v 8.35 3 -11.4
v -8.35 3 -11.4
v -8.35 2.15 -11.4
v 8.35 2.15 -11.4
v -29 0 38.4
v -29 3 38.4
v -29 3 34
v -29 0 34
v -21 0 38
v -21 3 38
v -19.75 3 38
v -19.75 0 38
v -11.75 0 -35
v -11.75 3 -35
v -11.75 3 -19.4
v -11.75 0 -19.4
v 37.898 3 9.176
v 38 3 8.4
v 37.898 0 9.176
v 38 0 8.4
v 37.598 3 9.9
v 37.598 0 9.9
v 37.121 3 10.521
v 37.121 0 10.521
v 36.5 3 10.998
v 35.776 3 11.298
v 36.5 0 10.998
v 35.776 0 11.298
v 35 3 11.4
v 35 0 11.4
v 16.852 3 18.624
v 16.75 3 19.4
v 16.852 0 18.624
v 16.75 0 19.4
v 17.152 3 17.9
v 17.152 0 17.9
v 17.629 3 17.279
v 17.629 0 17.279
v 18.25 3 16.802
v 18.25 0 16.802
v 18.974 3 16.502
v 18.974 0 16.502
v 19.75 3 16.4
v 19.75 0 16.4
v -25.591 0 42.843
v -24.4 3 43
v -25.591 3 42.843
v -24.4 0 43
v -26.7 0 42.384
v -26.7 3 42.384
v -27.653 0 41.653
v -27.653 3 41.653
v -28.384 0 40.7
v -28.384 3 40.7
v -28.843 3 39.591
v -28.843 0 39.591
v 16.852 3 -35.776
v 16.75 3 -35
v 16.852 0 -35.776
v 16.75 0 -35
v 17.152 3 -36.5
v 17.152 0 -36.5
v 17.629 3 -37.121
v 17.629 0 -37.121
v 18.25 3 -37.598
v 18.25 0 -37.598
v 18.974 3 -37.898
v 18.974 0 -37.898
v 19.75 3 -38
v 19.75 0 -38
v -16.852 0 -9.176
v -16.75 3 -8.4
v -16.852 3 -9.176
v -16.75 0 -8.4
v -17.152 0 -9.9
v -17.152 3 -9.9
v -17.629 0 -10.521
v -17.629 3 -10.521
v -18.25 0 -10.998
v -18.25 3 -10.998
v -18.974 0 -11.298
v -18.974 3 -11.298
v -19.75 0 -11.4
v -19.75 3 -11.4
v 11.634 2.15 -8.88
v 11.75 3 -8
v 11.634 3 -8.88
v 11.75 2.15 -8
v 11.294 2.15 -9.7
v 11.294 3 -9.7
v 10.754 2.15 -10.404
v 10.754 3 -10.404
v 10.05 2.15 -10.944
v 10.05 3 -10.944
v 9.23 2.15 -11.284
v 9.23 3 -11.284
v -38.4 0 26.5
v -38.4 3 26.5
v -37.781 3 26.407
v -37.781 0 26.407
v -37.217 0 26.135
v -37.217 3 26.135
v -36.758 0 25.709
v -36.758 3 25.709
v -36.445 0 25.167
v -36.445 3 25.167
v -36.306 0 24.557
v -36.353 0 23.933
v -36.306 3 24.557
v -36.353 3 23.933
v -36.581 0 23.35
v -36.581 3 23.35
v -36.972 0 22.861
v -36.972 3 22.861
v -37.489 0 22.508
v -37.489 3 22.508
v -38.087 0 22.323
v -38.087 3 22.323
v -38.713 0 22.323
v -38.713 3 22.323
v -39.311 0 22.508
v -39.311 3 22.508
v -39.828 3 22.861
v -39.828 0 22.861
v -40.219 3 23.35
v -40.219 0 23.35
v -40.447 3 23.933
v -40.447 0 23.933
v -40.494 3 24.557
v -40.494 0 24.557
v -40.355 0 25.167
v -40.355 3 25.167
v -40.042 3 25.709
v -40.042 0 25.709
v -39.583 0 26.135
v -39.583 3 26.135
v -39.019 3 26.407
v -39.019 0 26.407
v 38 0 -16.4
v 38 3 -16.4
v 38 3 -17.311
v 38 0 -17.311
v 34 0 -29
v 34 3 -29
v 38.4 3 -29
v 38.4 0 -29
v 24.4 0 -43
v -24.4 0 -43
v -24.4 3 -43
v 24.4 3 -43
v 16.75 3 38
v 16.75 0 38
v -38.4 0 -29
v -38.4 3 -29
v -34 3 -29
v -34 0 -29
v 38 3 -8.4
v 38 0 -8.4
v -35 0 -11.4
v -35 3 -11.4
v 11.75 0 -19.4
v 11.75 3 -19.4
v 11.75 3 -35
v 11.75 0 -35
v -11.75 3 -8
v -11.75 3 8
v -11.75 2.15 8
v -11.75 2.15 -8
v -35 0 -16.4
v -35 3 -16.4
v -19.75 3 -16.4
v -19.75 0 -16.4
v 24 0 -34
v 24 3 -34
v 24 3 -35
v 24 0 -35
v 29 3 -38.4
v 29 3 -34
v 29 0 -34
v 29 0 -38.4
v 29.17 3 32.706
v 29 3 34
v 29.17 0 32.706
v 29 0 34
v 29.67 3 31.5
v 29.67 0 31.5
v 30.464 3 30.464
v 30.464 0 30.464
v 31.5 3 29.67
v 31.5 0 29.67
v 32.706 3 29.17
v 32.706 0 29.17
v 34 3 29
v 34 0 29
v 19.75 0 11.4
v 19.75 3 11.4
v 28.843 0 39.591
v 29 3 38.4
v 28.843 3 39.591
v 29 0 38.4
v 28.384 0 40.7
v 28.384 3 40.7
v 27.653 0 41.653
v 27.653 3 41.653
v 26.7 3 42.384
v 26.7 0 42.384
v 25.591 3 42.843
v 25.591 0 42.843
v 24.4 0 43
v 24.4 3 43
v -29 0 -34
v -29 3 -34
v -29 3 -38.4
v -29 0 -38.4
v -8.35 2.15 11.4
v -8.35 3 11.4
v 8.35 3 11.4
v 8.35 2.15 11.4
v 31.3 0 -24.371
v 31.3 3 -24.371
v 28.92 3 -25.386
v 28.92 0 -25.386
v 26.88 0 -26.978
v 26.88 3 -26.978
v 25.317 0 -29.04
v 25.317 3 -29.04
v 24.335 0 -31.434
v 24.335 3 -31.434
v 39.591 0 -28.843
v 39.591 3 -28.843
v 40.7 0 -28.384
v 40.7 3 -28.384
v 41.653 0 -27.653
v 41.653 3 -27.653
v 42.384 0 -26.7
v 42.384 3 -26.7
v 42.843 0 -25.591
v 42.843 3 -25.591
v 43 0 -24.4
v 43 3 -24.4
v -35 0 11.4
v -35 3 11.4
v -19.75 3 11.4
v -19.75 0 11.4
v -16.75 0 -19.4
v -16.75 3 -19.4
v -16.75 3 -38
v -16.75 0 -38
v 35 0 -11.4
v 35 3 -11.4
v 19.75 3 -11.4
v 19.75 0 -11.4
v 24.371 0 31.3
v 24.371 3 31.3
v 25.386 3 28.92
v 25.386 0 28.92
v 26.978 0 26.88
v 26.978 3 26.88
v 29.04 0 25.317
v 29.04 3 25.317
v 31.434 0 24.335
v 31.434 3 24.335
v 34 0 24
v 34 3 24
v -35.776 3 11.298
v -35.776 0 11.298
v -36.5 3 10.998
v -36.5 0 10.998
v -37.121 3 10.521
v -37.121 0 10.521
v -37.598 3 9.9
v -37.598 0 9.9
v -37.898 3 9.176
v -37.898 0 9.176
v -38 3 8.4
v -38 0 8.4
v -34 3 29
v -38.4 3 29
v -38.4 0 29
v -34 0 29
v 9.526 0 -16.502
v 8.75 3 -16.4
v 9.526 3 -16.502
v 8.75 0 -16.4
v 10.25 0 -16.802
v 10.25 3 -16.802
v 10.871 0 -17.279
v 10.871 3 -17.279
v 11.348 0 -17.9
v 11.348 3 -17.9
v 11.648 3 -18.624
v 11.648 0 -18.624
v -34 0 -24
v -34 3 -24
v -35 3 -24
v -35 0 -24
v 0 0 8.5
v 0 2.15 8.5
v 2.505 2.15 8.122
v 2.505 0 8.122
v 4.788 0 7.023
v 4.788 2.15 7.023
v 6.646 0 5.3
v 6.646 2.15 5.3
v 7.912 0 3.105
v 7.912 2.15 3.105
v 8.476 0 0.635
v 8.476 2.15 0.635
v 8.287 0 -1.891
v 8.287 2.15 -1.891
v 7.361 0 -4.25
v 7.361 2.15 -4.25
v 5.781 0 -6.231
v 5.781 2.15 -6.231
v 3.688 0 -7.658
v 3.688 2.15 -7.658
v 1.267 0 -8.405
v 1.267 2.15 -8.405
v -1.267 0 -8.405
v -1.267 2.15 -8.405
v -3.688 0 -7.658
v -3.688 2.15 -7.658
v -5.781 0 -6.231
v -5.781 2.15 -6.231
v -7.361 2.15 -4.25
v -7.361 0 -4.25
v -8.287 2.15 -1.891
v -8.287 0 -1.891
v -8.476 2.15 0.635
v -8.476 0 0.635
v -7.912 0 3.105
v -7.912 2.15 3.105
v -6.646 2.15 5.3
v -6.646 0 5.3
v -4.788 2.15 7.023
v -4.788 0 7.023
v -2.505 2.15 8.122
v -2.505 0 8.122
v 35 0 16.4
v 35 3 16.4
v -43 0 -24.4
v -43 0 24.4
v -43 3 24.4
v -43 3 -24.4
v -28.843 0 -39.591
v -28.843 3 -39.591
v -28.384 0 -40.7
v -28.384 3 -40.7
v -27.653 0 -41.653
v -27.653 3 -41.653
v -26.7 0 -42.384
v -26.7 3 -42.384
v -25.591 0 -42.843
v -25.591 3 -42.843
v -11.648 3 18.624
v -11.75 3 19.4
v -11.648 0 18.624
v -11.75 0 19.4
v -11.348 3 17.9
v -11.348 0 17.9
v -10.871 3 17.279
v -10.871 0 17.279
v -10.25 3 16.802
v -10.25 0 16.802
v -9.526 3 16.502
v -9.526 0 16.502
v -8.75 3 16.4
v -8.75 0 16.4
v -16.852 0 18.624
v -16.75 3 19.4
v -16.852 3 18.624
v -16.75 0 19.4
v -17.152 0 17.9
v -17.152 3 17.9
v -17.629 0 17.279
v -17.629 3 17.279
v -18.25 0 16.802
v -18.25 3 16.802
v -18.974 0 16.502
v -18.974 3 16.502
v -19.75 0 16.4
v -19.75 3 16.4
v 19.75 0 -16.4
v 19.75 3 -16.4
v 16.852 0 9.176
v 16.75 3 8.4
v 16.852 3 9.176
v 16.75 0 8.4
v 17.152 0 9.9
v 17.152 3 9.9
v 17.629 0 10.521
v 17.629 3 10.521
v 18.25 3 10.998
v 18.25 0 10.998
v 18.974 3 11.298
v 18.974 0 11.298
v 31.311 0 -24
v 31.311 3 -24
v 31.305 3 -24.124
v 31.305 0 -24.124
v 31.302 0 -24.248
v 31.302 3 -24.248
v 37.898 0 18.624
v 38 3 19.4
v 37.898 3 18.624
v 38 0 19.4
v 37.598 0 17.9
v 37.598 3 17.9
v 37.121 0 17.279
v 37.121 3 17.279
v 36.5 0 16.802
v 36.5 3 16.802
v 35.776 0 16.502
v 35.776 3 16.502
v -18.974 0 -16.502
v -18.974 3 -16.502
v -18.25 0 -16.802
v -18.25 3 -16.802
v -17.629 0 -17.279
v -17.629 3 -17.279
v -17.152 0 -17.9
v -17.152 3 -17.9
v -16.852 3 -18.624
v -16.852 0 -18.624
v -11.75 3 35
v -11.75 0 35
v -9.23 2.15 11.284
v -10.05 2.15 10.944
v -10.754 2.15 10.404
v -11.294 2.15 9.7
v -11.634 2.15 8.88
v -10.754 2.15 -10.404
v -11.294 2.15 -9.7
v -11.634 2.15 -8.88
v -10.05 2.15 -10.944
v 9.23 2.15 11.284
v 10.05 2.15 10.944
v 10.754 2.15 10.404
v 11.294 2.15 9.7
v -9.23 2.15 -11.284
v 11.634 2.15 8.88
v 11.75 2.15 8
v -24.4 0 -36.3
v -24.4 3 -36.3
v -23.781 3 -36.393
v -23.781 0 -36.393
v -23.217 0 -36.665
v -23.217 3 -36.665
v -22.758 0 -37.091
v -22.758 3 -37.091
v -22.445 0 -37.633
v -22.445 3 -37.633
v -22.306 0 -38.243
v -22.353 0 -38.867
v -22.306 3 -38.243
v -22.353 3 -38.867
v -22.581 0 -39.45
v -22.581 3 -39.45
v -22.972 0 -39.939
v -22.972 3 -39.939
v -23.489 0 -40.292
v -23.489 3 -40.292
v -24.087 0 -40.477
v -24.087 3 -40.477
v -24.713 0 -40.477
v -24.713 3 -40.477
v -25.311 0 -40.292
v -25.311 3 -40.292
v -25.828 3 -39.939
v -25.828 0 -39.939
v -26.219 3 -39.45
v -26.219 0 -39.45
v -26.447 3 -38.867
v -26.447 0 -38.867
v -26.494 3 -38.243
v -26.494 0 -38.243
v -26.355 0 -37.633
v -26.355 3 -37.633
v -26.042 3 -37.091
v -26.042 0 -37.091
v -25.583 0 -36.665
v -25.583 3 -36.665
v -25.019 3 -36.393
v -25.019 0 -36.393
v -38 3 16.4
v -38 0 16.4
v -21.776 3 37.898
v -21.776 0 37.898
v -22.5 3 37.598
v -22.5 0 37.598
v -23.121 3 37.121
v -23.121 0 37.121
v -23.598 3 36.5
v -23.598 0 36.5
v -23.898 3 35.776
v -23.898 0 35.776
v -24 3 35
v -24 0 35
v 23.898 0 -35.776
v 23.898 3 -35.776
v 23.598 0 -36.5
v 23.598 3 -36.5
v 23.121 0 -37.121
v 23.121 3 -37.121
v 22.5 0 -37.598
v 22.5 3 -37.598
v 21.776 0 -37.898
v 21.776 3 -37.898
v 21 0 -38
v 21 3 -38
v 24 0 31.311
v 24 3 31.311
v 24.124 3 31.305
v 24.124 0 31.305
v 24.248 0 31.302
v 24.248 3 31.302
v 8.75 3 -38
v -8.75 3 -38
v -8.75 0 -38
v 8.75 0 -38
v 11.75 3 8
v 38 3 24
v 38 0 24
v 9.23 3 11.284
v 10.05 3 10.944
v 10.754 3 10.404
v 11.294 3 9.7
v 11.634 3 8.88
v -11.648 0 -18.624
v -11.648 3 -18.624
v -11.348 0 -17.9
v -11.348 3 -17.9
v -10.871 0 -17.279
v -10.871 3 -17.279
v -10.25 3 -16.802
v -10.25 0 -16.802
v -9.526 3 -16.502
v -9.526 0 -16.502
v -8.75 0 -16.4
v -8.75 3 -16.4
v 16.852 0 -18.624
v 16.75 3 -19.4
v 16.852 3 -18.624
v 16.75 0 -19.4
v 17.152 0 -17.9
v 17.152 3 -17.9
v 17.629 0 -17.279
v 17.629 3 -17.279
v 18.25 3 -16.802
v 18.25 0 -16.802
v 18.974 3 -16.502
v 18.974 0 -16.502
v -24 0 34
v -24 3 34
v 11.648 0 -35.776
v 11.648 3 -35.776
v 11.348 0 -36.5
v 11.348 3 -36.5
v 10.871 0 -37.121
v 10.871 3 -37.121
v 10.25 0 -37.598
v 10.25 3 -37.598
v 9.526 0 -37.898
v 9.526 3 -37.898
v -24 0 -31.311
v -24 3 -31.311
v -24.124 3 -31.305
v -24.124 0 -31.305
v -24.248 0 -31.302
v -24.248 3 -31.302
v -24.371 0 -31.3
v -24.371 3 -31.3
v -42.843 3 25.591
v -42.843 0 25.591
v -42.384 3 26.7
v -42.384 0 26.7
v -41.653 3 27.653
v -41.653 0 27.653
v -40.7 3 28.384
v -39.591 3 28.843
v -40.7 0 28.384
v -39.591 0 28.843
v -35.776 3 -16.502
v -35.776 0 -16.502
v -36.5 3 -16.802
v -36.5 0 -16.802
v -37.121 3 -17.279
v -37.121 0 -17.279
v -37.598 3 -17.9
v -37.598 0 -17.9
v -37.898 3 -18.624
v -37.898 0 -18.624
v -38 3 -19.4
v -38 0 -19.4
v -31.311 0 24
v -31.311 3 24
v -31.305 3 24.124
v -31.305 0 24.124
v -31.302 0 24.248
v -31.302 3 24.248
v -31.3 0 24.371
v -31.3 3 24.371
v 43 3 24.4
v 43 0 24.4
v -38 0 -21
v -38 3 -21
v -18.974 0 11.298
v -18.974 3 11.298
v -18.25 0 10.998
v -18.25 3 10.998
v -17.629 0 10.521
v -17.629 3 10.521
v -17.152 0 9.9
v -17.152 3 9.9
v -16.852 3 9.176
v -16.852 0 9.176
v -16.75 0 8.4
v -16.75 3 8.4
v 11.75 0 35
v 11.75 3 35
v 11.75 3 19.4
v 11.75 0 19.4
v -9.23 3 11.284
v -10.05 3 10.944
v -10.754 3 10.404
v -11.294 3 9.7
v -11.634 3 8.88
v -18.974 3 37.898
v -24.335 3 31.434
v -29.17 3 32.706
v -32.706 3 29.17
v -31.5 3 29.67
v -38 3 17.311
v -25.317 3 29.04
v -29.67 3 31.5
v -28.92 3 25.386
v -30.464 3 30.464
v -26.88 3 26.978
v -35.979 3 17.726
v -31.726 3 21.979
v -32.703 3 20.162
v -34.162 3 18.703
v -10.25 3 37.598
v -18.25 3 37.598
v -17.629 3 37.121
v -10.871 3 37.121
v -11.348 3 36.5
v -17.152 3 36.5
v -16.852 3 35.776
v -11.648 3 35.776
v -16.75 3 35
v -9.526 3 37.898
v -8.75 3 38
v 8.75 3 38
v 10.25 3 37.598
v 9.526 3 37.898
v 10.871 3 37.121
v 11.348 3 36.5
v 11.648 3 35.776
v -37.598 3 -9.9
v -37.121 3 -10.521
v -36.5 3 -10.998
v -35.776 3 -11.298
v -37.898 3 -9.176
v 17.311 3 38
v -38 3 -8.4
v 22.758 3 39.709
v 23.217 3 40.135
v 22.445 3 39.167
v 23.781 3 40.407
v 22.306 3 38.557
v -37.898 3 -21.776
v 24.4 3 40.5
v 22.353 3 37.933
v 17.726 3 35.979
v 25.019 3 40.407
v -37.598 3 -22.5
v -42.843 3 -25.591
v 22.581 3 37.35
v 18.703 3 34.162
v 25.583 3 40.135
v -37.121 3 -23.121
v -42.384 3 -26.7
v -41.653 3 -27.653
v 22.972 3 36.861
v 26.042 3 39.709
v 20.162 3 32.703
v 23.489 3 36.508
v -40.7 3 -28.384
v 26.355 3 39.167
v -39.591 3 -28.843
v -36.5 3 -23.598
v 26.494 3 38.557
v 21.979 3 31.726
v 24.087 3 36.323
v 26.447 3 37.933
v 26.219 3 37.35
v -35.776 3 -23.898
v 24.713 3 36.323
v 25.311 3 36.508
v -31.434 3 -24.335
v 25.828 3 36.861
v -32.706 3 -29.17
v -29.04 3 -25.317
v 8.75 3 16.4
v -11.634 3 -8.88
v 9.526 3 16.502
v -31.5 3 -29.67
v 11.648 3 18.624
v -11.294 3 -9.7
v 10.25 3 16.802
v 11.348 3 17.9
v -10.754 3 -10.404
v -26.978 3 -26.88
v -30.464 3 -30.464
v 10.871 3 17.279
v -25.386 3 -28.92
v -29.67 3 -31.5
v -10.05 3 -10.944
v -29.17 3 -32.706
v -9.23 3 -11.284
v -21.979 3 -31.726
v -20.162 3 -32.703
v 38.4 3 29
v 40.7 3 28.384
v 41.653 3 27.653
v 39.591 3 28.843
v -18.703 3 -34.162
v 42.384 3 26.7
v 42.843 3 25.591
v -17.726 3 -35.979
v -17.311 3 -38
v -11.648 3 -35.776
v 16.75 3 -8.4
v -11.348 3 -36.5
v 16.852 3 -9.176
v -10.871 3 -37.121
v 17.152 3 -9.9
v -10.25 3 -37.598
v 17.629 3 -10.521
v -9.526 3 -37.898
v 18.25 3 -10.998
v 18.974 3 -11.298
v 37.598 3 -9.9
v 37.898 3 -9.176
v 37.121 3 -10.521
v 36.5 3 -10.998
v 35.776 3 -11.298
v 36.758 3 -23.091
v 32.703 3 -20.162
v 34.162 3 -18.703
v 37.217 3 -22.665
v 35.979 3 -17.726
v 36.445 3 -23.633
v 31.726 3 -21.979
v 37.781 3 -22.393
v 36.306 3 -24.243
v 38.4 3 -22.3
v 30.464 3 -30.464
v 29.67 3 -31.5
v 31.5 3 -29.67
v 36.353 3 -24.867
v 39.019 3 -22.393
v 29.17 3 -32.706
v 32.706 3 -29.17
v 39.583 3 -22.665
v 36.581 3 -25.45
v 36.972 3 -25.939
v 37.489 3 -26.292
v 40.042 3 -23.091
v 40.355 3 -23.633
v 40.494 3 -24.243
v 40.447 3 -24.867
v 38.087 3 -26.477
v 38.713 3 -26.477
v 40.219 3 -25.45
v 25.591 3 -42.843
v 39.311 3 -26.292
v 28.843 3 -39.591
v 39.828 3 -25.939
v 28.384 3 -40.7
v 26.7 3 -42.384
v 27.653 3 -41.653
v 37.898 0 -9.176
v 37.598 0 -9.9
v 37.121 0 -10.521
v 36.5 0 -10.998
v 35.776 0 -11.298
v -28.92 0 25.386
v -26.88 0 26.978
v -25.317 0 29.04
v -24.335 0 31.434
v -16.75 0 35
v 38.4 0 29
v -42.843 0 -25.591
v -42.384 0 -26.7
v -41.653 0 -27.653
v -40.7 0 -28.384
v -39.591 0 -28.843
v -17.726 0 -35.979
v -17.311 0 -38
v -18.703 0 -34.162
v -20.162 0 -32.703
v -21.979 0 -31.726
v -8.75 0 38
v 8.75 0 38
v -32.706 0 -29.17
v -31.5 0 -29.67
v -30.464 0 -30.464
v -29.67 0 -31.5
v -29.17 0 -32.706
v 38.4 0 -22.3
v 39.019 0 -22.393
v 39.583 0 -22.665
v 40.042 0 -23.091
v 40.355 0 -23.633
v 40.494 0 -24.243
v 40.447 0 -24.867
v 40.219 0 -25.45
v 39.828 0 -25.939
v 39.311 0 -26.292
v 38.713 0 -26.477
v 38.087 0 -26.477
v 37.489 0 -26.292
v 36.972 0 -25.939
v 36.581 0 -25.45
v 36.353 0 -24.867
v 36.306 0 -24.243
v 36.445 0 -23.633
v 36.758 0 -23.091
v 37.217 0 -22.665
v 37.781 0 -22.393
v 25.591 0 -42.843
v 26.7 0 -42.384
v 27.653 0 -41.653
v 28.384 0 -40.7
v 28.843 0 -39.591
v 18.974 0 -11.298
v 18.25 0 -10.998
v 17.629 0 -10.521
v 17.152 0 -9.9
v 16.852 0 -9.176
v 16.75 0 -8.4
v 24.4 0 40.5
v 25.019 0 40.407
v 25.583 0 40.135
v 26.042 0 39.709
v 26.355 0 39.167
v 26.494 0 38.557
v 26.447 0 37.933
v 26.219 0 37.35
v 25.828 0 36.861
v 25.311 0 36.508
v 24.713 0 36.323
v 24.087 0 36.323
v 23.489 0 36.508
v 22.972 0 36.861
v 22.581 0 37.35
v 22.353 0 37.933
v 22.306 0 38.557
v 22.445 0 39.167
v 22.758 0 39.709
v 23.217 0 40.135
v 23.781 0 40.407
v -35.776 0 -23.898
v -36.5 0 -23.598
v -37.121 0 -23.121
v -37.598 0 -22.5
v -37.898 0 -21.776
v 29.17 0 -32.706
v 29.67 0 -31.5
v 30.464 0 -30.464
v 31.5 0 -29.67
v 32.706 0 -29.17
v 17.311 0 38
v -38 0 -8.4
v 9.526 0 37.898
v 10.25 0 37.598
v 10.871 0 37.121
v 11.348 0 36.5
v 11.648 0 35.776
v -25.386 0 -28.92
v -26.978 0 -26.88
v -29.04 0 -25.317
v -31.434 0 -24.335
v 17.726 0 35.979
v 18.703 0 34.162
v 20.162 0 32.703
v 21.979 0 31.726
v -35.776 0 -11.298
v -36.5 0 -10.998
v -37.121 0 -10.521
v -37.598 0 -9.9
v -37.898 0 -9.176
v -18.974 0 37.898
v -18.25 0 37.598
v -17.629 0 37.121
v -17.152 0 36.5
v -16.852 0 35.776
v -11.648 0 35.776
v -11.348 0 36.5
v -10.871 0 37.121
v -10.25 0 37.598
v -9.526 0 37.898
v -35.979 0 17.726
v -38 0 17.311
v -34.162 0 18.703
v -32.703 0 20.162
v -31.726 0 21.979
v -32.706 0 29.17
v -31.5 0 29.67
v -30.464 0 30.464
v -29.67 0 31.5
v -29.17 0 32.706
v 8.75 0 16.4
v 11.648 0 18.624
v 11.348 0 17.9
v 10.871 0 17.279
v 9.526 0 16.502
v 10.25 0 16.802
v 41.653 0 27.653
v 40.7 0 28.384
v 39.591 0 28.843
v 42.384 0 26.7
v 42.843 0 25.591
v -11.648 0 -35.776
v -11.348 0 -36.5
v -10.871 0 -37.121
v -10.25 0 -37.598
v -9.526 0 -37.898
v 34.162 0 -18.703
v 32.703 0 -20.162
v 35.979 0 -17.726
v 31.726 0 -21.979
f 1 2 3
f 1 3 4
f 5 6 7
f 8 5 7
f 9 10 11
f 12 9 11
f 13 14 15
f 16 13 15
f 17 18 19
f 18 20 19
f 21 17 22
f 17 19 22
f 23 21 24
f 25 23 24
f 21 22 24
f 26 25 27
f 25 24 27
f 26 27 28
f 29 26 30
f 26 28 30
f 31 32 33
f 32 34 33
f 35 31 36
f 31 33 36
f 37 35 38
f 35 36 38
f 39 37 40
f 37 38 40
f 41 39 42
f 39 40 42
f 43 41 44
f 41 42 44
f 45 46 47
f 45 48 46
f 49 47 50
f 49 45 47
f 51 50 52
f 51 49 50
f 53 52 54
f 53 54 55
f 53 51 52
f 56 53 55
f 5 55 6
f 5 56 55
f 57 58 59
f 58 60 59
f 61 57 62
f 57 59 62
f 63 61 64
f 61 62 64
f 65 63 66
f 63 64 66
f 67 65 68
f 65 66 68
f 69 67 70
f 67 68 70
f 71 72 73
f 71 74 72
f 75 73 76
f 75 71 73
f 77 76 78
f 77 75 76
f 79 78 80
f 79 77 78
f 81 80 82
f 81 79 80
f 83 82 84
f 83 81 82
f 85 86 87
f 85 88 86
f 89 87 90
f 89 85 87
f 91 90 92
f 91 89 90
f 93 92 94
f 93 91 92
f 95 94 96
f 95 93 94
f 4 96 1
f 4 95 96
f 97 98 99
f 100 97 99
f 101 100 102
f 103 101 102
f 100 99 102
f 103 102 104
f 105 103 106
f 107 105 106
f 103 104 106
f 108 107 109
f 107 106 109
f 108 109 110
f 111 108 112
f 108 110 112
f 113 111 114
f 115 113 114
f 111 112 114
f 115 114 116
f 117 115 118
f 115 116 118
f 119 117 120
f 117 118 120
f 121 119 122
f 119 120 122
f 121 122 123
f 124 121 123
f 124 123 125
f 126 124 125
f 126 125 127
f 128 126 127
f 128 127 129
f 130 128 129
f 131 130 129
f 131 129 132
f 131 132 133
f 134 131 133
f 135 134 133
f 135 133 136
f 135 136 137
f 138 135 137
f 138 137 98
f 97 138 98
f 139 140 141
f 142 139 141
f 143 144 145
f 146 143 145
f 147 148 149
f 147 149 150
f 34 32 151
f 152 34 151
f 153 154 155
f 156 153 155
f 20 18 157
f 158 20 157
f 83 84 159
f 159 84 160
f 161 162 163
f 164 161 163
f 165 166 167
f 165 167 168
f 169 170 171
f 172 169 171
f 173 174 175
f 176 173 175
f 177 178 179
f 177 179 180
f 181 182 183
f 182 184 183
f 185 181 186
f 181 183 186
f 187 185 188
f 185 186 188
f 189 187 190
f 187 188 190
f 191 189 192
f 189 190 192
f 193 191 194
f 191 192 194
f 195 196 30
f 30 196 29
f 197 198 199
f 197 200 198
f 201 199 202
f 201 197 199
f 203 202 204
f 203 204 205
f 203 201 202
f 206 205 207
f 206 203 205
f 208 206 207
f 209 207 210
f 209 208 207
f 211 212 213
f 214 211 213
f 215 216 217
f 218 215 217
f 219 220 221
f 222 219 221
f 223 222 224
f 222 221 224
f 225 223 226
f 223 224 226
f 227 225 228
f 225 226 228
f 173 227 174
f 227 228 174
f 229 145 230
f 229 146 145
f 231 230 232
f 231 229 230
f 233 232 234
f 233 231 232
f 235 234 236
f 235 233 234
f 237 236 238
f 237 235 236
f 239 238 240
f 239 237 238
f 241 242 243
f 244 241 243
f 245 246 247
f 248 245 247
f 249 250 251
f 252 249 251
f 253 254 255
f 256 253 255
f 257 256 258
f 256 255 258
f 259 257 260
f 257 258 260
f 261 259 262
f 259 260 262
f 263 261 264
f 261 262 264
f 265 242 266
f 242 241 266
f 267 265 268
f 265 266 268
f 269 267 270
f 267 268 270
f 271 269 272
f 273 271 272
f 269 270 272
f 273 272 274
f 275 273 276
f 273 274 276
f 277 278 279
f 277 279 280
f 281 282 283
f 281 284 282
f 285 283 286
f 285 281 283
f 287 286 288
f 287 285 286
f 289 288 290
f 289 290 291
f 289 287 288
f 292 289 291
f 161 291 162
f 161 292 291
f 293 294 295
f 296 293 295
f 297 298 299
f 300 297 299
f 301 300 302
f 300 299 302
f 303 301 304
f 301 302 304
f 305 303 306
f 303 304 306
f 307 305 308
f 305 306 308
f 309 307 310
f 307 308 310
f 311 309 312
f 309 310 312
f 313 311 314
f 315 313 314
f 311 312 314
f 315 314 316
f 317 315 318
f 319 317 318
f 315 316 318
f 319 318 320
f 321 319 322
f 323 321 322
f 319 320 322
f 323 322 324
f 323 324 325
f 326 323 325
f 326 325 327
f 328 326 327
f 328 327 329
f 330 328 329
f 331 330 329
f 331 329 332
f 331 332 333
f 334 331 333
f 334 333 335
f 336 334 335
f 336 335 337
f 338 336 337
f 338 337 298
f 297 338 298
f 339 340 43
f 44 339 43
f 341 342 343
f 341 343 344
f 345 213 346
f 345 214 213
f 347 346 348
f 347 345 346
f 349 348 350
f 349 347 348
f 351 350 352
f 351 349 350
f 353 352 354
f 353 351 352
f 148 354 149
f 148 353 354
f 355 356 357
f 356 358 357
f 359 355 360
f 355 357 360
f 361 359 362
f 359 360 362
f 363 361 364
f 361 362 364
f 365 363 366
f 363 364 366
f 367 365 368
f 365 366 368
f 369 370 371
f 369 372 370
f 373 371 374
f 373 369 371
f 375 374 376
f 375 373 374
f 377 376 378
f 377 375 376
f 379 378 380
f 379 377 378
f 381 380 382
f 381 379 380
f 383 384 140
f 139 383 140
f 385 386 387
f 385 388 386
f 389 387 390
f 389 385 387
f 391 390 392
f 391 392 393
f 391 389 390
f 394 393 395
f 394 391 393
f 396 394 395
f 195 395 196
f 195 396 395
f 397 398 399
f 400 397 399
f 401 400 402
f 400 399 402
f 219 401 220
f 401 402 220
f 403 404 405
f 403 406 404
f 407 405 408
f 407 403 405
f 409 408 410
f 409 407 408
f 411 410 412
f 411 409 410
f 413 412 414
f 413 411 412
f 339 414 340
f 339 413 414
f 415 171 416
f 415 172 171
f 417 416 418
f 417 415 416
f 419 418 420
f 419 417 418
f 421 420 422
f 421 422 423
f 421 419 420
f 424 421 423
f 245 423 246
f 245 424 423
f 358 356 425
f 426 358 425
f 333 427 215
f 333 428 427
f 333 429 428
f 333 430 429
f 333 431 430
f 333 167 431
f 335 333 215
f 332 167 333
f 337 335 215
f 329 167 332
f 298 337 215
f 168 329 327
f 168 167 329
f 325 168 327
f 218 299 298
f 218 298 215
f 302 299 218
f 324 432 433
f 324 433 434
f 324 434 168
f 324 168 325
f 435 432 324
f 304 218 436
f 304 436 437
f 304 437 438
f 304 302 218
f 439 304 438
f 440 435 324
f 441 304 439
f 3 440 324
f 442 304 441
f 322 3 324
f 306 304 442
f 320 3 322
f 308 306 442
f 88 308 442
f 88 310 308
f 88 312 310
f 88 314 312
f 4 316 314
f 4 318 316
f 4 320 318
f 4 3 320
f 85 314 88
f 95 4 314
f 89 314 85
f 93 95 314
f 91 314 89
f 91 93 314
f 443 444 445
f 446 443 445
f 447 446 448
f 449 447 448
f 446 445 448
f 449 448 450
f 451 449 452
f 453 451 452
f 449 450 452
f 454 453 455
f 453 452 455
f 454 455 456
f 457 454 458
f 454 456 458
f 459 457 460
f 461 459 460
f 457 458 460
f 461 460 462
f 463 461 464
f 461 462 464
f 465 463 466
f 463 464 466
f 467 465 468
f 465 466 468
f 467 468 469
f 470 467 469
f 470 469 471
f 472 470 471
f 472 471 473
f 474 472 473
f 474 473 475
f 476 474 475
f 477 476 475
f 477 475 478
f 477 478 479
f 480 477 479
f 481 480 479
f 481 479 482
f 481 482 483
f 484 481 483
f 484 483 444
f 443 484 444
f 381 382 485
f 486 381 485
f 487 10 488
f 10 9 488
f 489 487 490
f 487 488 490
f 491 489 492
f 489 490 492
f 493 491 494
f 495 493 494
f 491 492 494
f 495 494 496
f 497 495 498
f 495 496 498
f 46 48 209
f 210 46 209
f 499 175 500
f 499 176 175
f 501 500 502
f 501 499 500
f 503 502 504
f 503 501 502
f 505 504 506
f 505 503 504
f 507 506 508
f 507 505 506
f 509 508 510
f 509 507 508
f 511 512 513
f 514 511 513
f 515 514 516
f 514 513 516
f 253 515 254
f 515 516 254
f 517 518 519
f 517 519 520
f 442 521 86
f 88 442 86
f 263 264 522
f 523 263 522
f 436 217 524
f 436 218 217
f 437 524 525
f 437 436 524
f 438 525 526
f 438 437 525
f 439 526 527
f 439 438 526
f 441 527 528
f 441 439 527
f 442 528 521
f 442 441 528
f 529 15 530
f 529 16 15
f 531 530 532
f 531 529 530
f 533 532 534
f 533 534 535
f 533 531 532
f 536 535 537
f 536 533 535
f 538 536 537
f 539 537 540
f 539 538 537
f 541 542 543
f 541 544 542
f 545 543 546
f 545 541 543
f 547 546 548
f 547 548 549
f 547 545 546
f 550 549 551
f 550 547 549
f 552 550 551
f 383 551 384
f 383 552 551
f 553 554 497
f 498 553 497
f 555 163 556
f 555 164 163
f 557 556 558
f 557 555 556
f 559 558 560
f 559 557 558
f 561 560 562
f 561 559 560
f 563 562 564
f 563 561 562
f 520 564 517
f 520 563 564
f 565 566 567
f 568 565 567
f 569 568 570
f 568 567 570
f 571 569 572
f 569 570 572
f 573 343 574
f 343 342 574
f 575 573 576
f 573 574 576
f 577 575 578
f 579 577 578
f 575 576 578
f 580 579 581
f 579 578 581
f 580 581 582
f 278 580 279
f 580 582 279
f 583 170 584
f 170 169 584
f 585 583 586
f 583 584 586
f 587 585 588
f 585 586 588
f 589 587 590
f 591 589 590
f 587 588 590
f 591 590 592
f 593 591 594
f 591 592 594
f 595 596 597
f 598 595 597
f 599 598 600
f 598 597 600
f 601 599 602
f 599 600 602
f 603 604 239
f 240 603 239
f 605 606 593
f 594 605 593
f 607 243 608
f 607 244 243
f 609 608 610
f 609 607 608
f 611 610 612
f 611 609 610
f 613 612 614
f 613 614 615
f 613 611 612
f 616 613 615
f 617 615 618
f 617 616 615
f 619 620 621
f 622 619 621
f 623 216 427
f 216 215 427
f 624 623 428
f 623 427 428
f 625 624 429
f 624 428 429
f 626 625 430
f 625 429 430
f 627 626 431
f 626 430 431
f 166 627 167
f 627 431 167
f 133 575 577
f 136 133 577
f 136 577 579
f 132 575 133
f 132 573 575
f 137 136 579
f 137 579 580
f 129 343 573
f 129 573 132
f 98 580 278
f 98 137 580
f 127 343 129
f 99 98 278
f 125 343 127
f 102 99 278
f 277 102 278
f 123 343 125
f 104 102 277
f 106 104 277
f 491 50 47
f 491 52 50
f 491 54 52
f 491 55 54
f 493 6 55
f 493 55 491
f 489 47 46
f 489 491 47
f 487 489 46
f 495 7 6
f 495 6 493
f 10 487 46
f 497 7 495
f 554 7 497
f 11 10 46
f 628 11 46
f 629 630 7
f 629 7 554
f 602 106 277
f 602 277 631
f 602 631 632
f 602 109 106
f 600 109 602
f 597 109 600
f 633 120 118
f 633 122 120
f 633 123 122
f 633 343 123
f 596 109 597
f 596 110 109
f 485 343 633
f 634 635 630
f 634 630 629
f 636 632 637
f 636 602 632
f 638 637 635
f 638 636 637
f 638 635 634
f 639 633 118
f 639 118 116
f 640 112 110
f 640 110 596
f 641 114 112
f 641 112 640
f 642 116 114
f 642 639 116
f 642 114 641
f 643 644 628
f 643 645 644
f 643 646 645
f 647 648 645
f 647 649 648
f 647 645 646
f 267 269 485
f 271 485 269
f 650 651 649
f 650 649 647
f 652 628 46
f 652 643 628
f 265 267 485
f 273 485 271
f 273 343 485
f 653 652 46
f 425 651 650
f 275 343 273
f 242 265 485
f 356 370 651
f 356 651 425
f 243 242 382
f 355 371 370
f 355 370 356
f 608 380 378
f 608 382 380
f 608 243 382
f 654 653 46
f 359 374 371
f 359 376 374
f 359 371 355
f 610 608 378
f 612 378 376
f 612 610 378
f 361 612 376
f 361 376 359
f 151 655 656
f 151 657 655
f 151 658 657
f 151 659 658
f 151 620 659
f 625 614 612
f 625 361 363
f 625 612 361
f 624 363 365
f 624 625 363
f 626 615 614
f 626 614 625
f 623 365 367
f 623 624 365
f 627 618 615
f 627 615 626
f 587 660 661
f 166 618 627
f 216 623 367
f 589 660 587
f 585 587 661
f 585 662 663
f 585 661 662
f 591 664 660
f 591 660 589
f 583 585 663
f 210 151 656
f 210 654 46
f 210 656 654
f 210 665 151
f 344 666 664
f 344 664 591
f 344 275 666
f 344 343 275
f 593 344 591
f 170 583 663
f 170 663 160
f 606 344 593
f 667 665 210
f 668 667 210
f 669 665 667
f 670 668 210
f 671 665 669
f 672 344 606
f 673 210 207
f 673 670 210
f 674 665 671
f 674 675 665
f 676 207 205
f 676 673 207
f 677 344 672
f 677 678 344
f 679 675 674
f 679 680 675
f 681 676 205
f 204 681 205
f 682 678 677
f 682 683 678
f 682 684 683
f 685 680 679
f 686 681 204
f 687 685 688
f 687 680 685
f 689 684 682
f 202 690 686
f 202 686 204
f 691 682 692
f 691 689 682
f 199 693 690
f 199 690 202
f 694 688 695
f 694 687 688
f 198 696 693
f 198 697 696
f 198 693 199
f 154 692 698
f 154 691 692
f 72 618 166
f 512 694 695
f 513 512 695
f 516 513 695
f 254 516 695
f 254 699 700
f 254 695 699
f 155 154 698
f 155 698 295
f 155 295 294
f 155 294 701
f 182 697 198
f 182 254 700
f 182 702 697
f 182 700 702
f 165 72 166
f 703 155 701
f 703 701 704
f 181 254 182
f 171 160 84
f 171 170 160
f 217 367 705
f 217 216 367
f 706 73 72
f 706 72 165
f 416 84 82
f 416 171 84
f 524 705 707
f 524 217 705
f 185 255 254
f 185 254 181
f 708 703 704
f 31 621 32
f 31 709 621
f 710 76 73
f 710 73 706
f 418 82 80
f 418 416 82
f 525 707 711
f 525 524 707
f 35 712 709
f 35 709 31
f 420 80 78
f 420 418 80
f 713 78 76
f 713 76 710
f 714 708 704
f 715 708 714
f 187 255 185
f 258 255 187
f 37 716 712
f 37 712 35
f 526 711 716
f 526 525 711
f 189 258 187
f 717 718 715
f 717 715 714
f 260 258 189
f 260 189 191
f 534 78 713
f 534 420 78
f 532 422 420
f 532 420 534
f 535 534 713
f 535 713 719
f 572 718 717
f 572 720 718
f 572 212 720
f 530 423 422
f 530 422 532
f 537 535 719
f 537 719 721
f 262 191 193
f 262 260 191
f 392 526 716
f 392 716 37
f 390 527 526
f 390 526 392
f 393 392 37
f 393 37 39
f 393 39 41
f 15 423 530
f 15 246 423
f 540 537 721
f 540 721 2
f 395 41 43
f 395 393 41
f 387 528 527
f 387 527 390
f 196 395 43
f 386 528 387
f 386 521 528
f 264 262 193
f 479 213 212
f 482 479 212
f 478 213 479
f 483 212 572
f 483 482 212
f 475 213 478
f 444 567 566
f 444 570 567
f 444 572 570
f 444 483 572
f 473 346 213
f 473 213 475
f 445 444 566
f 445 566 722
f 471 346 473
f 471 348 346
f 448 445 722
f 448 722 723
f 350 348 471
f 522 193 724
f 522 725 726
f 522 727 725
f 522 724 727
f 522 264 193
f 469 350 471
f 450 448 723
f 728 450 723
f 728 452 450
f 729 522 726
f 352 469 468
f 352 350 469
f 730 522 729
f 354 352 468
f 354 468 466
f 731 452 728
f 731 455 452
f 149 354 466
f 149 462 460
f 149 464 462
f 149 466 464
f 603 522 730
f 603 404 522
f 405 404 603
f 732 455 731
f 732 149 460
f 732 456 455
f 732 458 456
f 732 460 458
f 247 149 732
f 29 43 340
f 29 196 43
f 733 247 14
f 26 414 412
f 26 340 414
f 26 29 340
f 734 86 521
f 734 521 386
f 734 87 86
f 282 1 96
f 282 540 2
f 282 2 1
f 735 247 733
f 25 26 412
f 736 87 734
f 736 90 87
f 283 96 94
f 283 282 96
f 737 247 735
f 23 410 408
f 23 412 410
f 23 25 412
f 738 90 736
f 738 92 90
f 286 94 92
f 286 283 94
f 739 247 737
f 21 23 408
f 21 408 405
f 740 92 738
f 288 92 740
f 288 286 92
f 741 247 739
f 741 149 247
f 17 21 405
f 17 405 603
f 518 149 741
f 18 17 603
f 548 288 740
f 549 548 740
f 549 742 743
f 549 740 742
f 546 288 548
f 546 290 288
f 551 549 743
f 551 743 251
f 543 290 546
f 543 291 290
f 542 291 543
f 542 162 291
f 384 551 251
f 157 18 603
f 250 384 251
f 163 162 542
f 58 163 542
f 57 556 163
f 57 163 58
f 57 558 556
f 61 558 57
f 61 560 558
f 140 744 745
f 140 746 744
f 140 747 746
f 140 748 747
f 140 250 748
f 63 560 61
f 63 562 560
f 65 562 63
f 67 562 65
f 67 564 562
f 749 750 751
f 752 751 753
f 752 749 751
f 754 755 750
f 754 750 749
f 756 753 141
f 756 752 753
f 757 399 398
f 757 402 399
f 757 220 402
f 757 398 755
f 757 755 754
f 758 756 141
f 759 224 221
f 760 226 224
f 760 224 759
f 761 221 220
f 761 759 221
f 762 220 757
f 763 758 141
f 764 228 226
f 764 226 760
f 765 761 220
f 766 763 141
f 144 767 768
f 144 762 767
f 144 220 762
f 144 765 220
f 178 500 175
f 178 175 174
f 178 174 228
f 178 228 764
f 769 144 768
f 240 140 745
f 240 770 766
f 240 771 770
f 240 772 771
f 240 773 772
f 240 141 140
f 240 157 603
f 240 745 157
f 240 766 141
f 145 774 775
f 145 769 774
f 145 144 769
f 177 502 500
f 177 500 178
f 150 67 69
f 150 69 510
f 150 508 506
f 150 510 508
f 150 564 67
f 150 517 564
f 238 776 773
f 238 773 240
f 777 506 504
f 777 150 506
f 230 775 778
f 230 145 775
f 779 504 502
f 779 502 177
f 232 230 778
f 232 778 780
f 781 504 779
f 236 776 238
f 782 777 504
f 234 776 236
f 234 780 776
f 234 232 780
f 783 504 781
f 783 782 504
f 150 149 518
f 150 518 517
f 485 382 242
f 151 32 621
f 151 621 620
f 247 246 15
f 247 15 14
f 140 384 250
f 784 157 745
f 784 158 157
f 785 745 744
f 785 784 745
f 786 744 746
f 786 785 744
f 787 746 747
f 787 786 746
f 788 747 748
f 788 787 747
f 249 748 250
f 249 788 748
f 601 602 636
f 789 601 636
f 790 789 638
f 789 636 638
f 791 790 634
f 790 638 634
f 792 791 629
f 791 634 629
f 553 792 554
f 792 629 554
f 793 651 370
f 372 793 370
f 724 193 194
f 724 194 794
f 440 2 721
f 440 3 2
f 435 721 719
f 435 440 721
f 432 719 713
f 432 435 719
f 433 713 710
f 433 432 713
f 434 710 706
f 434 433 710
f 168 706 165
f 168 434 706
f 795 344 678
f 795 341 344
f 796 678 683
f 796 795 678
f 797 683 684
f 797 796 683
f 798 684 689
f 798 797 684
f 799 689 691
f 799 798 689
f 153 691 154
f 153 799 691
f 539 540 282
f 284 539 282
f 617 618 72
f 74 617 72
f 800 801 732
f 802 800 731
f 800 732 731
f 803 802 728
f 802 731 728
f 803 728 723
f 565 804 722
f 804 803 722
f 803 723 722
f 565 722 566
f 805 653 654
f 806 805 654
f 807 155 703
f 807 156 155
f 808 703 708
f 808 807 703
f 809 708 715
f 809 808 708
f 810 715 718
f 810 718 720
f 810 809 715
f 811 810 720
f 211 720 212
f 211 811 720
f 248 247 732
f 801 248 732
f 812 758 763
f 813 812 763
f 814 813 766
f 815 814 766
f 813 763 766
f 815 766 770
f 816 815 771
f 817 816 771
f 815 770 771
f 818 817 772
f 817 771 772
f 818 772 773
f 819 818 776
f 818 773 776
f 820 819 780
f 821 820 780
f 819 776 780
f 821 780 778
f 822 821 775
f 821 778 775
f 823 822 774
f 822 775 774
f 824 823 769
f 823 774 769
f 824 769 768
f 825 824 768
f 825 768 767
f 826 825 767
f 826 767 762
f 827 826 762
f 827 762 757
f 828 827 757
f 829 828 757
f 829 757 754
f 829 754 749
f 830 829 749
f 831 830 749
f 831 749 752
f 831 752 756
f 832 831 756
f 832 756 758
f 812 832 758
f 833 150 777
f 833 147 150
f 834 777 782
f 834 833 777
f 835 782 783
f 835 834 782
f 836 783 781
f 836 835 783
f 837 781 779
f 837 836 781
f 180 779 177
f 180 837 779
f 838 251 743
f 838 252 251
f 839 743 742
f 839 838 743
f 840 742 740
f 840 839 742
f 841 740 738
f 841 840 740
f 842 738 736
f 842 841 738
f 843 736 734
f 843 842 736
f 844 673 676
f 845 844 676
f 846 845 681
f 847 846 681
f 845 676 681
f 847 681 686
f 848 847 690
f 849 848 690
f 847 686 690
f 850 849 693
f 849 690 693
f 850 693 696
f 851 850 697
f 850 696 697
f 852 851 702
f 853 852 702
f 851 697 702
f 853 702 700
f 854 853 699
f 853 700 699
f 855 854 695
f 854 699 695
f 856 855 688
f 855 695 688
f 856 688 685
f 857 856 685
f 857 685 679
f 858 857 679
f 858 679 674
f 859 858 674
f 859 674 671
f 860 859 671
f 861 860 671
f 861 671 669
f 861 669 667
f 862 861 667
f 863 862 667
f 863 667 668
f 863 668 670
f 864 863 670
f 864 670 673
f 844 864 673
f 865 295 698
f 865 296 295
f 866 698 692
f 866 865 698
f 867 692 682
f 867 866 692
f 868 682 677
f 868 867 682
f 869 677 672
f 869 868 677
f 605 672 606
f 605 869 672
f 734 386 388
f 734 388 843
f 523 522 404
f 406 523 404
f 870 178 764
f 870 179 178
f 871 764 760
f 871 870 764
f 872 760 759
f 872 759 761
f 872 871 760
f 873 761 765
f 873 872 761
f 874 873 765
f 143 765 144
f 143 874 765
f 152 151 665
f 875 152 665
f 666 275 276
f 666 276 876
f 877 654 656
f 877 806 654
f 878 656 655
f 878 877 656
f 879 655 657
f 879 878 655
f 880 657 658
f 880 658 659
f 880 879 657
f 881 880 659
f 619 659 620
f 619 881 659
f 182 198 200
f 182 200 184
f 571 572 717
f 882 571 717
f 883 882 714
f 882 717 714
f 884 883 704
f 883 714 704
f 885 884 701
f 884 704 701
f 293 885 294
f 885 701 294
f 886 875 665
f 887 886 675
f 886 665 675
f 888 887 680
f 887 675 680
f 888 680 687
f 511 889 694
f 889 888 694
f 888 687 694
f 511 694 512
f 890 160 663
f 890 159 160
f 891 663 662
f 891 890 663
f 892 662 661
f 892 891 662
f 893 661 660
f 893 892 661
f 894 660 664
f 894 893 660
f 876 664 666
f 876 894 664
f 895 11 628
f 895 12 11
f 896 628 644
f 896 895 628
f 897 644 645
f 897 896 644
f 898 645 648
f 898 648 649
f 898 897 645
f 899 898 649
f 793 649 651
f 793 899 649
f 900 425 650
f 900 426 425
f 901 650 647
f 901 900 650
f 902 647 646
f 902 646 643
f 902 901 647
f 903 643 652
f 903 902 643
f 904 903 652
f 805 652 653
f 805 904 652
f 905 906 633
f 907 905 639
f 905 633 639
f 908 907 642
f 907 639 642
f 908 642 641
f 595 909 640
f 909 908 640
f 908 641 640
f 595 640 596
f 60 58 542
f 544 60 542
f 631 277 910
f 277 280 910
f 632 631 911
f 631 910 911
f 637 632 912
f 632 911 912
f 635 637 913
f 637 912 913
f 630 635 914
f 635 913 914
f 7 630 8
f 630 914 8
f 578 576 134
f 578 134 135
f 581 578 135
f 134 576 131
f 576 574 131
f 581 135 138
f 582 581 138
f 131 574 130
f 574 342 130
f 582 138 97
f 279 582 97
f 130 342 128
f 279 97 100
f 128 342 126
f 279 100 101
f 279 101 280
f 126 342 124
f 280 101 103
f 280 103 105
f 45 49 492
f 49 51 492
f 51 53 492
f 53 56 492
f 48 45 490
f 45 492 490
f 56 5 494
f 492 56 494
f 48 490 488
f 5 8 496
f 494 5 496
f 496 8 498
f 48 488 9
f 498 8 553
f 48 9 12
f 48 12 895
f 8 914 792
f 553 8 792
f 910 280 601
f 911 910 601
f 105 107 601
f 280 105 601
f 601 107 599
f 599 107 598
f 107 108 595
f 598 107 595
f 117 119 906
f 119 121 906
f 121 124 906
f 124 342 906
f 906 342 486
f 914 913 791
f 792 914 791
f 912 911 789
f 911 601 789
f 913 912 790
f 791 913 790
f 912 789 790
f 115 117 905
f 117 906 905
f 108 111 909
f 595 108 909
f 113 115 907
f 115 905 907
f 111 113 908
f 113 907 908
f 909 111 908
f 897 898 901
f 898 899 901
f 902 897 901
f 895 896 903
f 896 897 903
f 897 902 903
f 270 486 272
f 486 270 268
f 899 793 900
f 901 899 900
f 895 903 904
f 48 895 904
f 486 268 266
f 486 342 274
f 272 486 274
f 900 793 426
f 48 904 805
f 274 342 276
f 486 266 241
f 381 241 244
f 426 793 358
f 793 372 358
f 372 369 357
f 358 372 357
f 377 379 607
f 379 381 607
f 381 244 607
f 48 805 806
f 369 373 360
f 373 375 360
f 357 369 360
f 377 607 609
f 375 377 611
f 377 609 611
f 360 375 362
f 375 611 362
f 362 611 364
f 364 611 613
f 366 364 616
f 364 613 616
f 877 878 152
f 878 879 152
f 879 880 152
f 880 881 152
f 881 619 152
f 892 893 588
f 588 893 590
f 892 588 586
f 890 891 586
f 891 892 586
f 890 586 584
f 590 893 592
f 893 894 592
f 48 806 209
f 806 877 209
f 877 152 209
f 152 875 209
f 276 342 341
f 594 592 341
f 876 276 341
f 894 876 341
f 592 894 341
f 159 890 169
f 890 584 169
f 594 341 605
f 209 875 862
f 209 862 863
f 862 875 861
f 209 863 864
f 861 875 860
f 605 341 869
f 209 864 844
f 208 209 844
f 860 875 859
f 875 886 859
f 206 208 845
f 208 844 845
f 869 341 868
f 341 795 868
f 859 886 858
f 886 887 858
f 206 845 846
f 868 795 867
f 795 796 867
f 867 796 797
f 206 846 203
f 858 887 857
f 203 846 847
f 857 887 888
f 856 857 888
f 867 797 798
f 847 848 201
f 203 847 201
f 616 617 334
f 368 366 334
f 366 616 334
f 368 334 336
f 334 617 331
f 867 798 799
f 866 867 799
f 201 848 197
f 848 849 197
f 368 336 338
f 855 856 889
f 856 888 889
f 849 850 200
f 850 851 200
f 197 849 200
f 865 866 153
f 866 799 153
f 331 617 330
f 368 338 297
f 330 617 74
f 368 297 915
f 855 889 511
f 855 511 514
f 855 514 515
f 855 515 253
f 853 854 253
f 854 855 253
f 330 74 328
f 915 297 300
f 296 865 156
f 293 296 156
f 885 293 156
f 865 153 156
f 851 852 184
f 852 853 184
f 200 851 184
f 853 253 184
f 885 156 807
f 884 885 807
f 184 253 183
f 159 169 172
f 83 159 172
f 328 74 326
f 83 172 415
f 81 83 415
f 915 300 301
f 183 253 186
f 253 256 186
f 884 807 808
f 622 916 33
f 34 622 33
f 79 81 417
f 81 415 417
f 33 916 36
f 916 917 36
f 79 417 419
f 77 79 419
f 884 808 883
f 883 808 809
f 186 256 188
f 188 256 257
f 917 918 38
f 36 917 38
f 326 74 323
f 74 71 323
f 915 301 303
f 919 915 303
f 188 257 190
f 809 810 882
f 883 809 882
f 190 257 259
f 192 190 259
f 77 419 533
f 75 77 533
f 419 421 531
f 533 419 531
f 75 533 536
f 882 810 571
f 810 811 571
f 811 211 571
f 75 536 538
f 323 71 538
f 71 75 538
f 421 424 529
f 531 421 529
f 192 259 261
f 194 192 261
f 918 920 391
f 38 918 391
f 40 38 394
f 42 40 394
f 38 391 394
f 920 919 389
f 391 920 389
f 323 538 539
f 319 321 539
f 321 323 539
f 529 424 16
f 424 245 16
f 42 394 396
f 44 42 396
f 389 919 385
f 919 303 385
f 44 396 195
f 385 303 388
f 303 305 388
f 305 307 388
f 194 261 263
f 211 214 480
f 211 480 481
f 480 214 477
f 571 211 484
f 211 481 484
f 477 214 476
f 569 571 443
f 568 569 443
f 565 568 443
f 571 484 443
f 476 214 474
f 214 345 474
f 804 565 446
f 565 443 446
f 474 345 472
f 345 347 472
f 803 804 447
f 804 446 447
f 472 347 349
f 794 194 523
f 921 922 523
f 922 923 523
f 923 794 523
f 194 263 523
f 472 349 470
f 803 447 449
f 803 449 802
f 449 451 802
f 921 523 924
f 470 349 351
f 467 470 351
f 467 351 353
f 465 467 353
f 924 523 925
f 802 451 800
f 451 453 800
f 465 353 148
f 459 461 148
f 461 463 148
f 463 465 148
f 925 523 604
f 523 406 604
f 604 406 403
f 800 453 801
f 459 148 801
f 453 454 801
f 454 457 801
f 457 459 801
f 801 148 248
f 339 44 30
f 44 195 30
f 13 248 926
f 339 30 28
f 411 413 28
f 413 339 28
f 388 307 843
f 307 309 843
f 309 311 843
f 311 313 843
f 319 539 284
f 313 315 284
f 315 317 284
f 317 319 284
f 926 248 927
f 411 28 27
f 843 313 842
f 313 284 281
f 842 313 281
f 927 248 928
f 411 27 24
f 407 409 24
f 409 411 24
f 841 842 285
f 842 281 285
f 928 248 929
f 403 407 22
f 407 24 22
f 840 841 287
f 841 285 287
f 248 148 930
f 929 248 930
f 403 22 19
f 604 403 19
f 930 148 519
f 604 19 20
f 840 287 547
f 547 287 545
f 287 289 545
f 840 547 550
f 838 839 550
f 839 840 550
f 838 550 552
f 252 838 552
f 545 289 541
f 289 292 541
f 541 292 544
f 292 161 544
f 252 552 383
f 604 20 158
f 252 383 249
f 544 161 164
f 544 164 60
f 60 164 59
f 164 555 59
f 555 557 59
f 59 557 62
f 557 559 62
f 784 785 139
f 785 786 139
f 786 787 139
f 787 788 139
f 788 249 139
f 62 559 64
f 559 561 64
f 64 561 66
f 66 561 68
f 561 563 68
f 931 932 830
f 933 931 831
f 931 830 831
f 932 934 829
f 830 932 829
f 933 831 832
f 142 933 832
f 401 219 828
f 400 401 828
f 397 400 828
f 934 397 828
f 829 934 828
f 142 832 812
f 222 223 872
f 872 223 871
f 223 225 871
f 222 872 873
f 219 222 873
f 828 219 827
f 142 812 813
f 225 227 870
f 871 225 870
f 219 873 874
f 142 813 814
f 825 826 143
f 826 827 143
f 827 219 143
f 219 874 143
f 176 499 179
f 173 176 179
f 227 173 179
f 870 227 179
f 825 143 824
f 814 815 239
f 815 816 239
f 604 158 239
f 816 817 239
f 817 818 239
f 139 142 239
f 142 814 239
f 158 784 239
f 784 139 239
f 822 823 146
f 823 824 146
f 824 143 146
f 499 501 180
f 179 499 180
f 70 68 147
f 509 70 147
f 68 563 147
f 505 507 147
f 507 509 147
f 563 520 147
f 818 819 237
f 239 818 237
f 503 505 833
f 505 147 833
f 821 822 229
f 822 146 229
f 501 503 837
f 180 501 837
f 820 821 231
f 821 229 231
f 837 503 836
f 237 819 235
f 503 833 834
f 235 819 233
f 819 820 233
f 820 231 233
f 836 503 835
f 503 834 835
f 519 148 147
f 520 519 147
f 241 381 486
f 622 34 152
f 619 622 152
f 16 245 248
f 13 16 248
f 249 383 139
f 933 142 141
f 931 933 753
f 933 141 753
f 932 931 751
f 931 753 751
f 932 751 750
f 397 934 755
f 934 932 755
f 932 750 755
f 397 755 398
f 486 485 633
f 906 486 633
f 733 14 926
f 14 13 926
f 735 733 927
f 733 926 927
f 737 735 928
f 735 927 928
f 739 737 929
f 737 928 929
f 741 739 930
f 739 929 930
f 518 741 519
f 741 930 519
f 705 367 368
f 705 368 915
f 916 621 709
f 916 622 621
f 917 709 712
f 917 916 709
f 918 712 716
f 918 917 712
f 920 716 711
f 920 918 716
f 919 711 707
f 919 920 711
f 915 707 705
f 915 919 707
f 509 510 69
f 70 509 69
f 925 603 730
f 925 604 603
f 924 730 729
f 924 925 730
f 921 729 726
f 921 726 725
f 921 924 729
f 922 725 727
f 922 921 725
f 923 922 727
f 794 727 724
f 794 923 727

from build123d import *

# Parameters (mm, degrees)
SKETCH1_W           = 86
SKETCH1_H           = 86
BOSS_EXTRUDE1_DEPTH = 3
SKETCH2_R           = 8.5
SKETCH2_W           = 14
SKETCH2_H           = 14
CUT_EXTRUDE1_DEPTH  = 61.88513776
FILLET1_R           = 4.6
FILLET2_R           = 5
SKETCH3_R           = 2.1
CUT_EXTRUDE2_DEPTH  = 61.88513776
SKETCH4_W           = 23.5
SKETCH4_H           = 22.8
SKETCH4_R           = 8.5
CUT_EXTRUDE3_DEPTH  = 0.85
FILLET3_R           = 3.4
SKETCH5_W           = 23.5
SKETCH5_H           = 14
SKETCH5_H_2         = 7.6
SKETCH5_W_2         = 14
SKETCH5_H_3         = 22.8
SKETCH5_W_3         = 7.25
CUT_EXTRUDE4_DEPTH  = 61.88513776
FILLET4_R           = 3


with BuildPart() as part:
    # Sketch1 → Boss-Extrude1 (new body)
    with BuildSketch(Plane(origin=(0, 0, 0), x_dir=(1, 0, 0), z_dir=(0, 1, 0))):
        Rectangle(SKETCH1_W, SKETCH1_H)
    extrude(amount=BOSS_EXTRUDE1_DEPTH)

    # Sketch2 → Cut-Extrude1 (cut, through all)
    with BuildSketch(Plane(origin=(0, 3, 0), x_dir=(1, 0, 0), z_dir=(0, 1, 0))):
        with Locations(Location((0, 0, 0), (0, 0, 270))):
            Circle(SKETCH2_R)
        with Locations((36, 36)):
            Rectangle(SKETCH2_W, SKETCH2_H)
        with Locations((-36, 36)):
            Rectangle(SKETCH2_W, SKETCH2_H)
        with Locations((36, -36)):
            Rectangle(SKETCH2_W, SKETCH2_H)
        with Locations((-36, -36)):
            Rectangle(SKETCH2_W, SKETCH2_H)
    extrude(amount=-CUT_EXTRUDE1_DEPTH, mode=Mode.SUBTRACT)

    # Fillet1
    fillet1_edges = [part.edges().sort_by_distance(p)[0] for p in [
        (-43, 1.5, 29),
        (-29, 1.5, 43),
        (43, 1.5, 29),
        (29, 1.5, 43),
        (29, 1.5, -43),
        (43, 1.5, -29),
        (-43, 1.5, -29),
        (-29, 1.5, -43),
    ]]
    fillet(fillet1_edges, radius=FILLET1_R)

    # Fillet2
    fillet2_edges = [part.edges().sort_by_distance(p)[0] for p in [
        (-29, 1.5, 29),
        (29, 1.5, 29),
        (29, 1.5, -29),
        (-29, 1.5, -29),
    ]]
    fillet(fillet2_edges, radius=FILLET2_R)

    # Sketch3 → Cut-Extrude2 (cut, through all)
    with BuildSketch(Plane(origin=(0, 3, 0), x_dir=(1, 0, 0), z_dir=(0, 1, 0))):
        with Locations(Location((38.4, 24.4, 0), (0, 0, 270))):
            Circle(SKETCH3_R)
        with Locations(Location((-24.4, 38.4, 0), (0, 0, 270))):
            Circle(SKETCH3_R)
        with Locations(Location((24.4, -38.4, 0), (0, 0, 270))):
            Circle(SKETCH3_R)
        with Locations(Location((-38.4, -24.4, 0), (0, 0, 270))):
            Circle(SKETCH3_R)
    extrude(amount=-CUT_EXTRUDE2_DEPTH, mode=Mode.SUBTRACT)

    # Sketch4 → Cut-Extrude3 (cut)
    with BuildSketch(Plane(origin=(0, 3, 0), x_dir=(1, 0, 0), z_dir=(0, 1, 0))):
        Rectangle(SKETCH4_W, SKETCH4_H)
        with Locations(Location((0, 0, 0), (0, 0, 270))):
            Circle(SKETCH4_R, mode=Mode.SUBTRACT)
    extrude(amount=-CUT_EXTRUDE3_DEPTH, mode=Mode.SUBTRACT)

    # Fillet3
    fillet3_edges = [part.edges().sort_by_distance(p)[0] for p in [
        (-11.75, 2.575, 11.4),
        (-11.75, 2.575, -11.4),
        (11.75, 2.575, -11.4),
        (11.75, 2.575, 11.4),
    ]]
    fillet(fillet3_edges, radius=FILLET3_R)

    # Sketch5 → Cut-Extrude4 (cut, through all)
    with BuildSketch(Plane(origin=(0, 3, 0), x_dir=(1, 0, 0), z_dir=(0, 1, 0))):
        with Locations((0, 31)):
            Rectangle(SKETCH5_W, SKETCH5_H)
        with Locations((0, 20.2)):
            Rectangle(SKETCH5_W, SKETCH5_H_2)
        with Locations((-31, 0)):
            Rectangle(SKETCH5_W_2, SKETCH5_H_3)
        with Locations((-20.375, 0)):
            Rectangle(SKETCH5_W_3, SKETCH5_H_3)
        with Locations((31, 0)):
            Rectangle(SKETCH5_W_2, SKETCH5_H_3)
        with Locations((20.375, 0)):
            Rectangle(SKETCH5_W_3, SKETCH5_H_3)
        with Locations((0, -20.2)):
            Rectangle(SKETCH5_W, SKETCH5_H_2)
        with Locations((0, -31)):
            Rectangle(SKETCH5_W, SKETCH5_H)
        with Locations((20.375, -20.2)):
            Rectangle(SKETCH5_W_3, SKETCH5_H_2)
        Polygon((24, -16.4), (24, -24), (34, -24), (38, -24), (38, -16.4), align=None)
        with BuildLine():
            Line((24, -24), (16.75, -24))
            Line((16.75, -24), (16.75, -38))
            Line((16.75, -38), (17.311276561, -38))
            ThreePointArc((17.311276561, -38), (19.379541854, -33.379541854), (24, -31.311276561))
            Line((24, -31.311276561), (24, -24))
        make_face()
        with BuildLine():
            Line((34, -24), (24, -24))
            Line((24, -24), (24, -31.311276561))
            ThreePointArc((24, -31.311276561), (24.185616902, -31.303237366), (24.371380604, -31.300057681))
            ThreePointArc((24.371380604, -31.300057681), (27.958453145, -26.031329371), (34, -24))
        make_face()
        Polygon((-16.75, -24), (-24, -24), (-24, -34), (-24, -38), (-16.75, -38), align=None)
        with Locations((-20.375, -20.2)):
            Rectangle(SKETCH5_W_3, SKETCH5_H_2)
        with BuildLine():
            Line((-24, -24), (-24, -16.4))
            Line((-24, -16.4), (-38, -16.4))
            Line((-38, -16.4), (-38, -17.311276561))
            ThreePointArc((-38, -17.311276561), (-33.379541854, -19.379541854), (-31.311276561, -24))
            Line((-31.311276561, -24), (-24, -24))
        make_face()
        with BuildLine():
            Line((-24, -34), (-24, -24))
            Line((-24, -24), (-31.311276561, -24))
            ThreePointArc((-31.311276561, -24), (-31.303237366, -24.185616902), (-31.300057681, -24.371380604))
            ThreePointArc((-31.300057681, -24.371380604), (-26.031329371, -27.958453145), (-24, -34))
        make_face()
        Polygon((-38, 16.4), (-24, 16.4), (-24, 24), (-34, 24), (-38, 24), align=None)
        with BuildLine():
            Line((-24, 31.311276561), (-24, 24))
            Line((-24, 24), (-16.75, 24))
            Line((-16.75, 24), (-16.75, 38))
            Line((-16.75, 38), (-17.311276561, 38))
            ThreePointArc((-17.311276561, 38), (-19.379541854, 33.379541854), (-24, 31.311276561))
        make_face()
        with Locations((-20.375, 20.2)):
            Rectangle(SKETCH5_W_3, SKETCH5_H_2)
        with BuildLine():
            Line((-34, 24), (-24, 24))
            Line((-24, 24), (-24, 31.311276561))
            ThreePointArc((-24, 31.311276561), (-24.185616902, 31.303237366), (-24.371380604, 31.300057681))
            ThreePointArc((-24.371380604, 31.300057681), (-27.958453145, 26.031329371), (-34, 24))
        make_face()
        Polygon((16.75, 38), (16.75, 24), (24, 24), (24, 34), (24, 38), align=None)
        with Locations((20.375, 20.2)):
            Rectangle(SKETCH5_W_3, SKETCH5_H_2)
        with BuildLine():
            Line((31.311276561, 24), (24, 24))
            Line((24, 24), (24, 16.4))
            Line((24, 16.4), (38, 16.4))
            Line((38, 16.4), (38, 17.311276561))
            ThreePointArc((38, 17.311276561), (33.379541854, 19.379541854), (31.311276561, 24))
        make_face()
        with BuildLine():
            Line((24, 34), (24, 24))
            Line((24, 24), (31.311276561, 24))
            ThreePointArc((31.311276561, 24), (31.303237366, 24.185616902), (31.300057681, 24.371380604))
            ThreePointArc((31.300057681, 24.371380604), (26.031329371, 27.958453145), (24, 34))
        make_face()
    extrude(amount=-CUT_EXTRUDE4_DEPTH, mode=Mode.SUBTRACT)

    # Fillet4
    fillet4_edges = [part.edges().sort_by_distance(p)[0] for p in [
        (-16.75, 1.5, 11.4),
        (-38, 1.5, 11.4),
        (-38, 1.5, -11.4),
        (-16.75, 1.5, -11.4),
        (16.75, 1.5, -11.4),
        (38, 1.5, -11.4),
        (38, 1.5, 11.4),
        (16.75, 1.5, 11.4),
        (-11.75, 1.5, 38),
        (-11.75, 1.5, 16.4),
        (11.75, 1.5, 16.4),
        (11.75, 1.5, 38),
        (16.75, 1.5, 16.4),
        (38, 1.5, 16.4),
        (-16.75, 1.5, 16.4),
        (-16.75, 1.5, 38),
        (-24, 1.5, 38),
        (-38, 1.5, -24),
        (-16.75, 1.5, -16.4),
        (-38, 1.5, -16.4),
        (16.75, 1.5, -16.4),
        (16.75, 1.5, -38),
        (24, 1.5, -38),
        (-11.75, 1.5, -16.4),
        (-11.75, 1.5, -38),
        (11.75, 1.5, -38),
        (11.75, 1.5, -16.4),
    ]]
    fillet(fillet4_edges, radius=FILLET4_R)


solid = part.part
